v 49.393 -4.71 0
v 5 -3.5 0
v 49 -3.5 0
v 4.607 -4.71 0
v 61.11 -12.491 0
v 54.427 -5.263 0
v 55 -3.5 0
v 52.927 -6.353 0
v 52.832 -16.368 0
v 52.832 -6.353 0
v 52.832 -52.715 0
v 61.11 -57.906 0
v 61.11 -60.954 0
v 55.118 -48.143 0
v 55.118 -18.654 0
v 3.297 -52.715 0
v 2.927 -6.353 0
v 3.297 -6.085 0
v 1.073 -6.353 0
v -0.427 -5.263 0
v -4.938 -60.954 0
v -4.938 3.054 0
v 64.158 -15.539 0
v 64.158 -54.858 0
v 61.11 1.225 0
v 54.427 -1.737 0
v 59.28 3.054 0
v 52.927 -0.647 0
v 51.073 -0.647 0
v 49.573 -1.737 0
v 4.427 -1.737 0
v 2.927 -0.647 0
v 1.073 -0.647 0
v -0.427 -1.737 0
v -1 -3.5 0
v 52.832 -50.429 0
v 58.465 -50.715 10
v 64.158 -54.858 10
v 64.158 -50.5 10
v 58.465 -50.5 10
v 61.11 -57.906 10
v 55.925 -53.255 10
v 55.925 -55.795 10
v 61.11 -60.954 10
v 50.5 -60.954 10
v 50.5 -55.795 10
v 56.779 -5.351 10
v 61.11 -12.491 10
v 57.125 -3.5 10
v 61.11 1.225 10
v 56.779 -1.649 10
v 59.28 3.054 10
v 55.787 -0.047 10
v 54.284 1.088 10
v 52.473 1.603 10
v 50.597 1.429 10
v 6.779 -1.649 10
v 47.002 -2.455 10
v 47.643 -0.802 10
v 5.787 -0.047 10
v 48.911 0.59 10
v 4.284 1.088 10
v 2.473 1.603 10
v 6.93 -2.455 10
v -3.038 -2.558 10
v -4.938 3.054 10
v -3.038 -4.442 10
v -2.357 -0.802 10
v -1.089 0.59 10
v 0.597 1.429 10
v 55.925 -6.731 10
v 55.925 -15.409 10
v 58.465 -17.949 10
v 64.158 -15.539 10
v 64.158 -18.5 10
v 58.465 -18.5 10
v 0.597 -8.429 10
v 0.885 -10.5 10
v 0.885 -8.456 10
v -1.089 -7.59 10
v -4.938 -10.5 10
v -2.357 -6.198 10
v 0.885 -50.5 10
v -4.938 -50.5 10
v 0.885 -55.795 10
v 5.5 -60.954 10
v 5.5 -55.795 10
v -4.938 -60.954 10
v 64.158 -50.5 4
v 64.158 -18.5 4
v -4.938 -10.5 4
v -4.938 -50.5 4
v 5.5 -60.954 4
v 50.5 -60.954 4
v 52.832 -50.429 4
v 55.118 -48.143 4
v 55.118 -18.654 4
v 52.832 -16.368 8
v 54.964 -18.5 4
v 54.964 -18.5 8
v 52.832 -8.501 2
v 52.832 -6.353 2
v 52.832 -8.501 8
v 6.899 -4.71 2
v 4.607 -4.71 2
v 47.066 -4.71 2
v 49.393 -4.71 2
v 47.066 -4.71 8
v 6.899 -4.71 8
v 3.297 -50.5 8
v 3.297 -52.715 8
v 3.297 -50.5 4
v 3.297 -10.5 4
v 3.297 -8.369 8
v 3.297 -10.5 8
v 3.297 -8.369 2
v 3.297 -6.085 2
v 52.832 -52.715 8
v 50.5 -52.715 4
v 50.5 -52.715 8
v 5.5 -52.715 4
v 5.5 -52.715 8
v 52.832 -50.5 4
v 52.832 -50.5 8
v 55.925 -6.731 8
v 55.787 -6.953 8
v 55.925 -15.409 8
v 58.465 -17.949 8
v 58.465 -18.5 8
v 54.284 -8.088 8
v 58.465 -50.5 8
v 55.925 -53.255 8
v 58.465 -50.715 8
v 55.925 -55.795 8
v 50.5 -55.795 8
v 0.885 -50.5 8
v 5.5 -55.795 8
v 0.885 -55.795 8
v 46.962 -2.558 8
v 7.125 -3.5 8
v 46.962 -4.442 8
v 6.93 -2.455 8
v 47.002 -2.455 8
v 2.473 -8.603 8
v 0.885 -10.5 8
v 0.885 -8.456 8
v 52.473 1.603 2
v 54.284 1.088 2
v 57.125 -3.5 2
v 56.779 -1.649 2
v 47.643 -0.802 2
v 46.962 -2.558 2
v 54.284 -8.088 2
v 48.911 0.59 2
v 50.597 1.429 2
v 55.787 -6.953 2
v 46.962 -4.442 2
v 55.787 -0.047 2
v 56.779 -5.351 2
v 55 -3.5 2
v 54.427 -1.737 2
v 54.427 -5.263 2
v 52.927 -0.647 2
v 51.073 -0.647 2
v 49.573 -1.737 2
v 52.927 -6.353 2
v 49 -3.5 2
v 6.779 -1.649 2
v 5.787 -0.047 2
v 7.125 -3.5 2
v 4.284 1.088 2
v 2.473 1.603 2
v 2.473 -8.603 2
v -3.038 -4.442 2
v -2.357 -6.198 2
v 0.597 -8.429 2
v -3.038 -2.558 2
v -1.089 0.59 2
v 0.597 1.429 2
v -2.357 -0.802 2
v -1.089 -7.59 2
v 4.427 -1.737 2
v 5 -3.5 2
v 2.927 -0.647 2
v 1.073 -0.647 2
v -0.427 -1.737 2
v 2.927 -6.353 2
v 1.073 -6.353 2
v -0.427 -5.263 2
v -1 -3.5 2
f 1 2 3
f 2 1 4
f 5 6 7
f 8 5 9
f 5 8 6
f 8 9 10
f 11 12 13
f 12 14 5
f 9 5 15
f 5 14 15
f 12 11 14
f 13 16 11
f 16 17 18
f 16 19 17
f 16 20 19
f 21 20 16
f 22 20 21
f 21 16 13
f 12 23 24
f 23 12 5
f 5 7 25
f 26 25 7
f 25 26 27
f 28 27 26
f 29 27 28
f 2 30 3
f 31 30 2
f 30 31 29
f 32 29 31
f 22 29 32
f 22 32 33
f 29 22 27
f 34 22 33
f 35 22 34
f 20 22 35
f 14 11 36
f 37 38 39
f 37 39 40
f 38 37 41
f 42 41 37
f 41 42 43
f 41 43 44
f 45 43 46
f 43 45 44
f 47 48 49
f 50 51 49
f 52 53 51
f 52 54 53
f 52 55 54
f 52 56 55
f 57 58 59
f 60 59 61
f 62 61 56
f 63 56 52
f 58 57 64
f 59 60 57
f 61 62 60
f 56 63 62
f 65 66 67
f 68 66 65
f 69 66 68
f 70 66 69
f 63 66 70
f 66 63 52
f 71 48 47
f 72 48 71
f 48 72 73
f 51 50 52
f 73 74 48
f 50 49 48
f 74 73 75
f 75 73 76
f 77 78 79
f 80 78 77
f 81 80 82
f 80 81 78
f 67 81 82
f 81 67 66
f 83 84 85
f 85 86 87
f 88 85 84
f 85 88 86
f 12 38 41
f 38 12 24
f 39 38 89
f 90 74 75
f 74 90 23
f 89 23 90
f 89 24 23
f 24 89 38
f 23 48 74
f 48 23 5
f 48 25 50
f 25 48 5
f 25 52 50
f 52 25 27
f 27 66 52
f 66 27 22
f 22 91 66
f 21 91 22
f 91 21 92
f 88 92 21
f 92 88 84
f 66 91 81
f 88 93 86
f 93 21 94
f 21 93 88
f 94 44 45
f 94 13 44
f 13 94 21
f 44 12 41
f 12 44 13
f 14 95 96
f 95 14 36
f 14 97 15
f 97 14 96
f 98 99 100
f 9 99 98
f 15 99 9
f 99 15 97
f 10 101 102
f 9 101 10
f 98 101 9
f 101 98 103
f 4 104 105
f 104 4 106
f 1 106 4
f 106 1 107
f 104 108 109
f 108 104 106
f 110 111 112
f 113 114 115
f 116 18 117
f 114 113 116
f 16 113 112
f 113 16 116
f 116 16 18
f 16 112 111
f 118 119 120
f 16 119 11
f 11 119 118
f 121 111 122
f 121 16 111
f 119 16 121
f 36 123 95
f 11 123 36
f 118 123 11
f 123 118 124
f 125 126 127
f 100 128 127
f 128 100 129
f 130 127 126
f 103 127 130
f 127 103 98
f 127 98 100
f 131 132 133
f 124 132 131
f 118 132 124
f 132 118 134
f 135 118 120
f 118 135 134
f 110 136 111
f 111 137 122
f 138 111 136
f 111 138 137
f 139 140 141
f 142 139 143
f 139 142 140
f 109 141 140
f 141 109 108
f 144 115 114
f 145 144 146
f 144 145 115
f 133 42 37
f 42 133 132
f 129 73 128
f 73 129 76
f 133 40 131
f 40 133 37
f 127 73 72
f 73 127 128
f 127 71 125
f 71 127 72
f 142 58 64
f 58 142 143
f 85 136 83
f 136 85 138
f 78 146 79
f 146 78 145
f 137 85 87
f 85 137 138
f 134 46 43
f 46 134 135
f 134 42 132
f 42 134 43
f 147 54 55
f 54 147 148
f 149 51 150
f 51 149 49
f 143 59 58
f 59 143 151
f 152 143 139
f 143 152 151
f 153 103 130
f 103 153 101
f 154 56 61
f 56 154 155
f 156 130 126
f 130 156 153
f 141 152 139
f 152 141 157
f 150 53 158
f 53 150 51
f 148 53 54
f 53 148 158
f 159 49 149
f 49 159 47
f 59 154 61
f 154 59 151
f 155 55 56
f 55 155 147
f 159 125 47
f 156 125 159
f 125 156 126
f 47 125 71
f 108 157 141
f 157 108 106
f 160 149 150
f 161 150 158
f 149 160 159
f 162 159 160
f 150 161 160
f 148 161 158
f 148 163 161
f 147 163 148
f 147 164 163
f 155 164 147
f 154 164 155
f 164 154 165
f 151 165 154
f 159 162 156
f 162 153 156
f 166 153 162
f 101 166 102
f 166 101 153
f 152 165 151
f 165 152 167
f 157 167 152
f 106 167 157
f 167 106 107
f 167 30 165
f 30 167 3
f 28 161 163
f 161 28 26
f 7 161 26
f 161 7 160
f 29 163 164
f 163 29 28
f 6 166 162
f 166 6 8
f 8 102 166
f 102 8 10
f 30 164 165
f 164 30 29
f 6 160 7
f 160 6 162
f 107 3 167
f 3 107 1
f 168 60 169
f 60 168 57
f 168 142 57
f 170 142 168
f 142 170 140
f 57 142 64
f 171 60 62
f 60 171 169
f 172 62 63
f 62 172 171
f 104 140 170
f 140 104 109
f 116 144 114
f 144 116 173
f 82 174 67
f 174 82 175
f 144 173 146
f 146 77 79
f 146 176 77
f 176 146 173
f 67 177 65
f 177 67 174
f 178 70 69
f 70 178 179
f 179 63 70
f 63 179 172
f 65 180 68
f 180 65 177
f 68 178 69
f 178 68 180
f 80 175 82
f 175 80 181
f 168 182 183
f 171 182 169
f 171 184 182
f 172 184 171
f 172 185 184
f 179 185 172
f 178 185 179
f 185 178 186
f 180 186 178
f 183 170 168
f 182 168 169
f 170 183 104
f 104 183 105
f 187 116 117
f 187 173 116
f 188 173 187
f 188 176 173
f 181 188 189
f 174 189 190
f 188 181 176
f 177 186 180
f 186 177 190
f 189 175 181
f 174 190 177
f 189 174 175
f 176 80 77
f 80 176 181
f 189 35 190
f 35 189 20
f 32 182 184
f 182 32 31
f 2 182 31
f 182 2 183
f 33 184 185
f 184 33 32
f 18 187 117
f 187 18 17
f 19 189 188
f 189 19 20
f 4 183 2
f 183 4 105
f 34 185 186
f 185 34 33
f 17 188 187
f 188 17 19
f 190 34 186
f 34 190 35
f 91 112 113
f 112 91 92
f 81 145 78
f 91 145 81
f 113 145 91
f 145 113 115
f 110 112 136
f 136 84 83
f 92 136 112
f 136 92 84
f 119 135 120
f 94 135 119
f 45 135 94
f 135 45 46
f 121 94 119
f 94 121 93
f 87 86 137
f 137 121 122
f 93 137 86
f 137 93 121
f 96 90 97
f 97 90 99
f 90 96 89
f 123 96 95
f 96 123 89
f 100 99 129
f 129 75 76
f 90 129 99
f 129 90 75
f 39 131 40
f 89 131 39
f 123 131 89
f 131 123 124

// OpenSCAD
// thickness of the PCB
board_height = 5;

// solid_holes - specifies if mounting holes should be added to or subtracted from the model
// combined_headers - specifies if space should be left between adjacent female headers, or if they should be rendered as a single header
// extend_ports - extends the USB and power ports by a centimeter, so that holes are more easily made when a model is used as a negative

module Board()
{
	color([0, 0.6, 0.8])
	linear_extrude(height = board_height, convexity = 10, twist = 0)
	{
		polygon( points = [ [-4.115, 2.545],
						[49.4, 2.545],
						[50.925, 1.021],
						[50.925, -10.409],
						[53.465, -12.949],
						[53.465, -45.715],
						[50.925, -48.255],
						[50.925, -50.795],
						[-4.115, -50.795] ],
				paths = [[0, 1, 2, 3, 4, 5, 6, 7, 8]],
				convexity = 10);
	}
}

module ArduinoMount() {
    difference() {
        scale([1.2,1.2,2])
            Board();
        translate([7,-7,0])
        scale([0.9,0.9,2])
            Board();
        translate([5,-5,8])
            Board();
        
        translate([52,-3.5,2])
            cylinder(d = 10.25,h = 20);
        translate([52,-3.5,0])
            cylinder(d = 6,h = 20);
        translate([2,-3.5,2])
            cylinder(d = 10.25,h = 20);
        translate([2,-3.5,0])
            cylinder(d = 6,h = 20);
        
        translate([-10,-50.5,4])
            cube([40,40,10]);
        translate([5.5,-70,4])
            cube([45,40,10]);
        translate([41,-50.5,4])
            cube([45,32,10]);
    }
}

ArduinoMount();
